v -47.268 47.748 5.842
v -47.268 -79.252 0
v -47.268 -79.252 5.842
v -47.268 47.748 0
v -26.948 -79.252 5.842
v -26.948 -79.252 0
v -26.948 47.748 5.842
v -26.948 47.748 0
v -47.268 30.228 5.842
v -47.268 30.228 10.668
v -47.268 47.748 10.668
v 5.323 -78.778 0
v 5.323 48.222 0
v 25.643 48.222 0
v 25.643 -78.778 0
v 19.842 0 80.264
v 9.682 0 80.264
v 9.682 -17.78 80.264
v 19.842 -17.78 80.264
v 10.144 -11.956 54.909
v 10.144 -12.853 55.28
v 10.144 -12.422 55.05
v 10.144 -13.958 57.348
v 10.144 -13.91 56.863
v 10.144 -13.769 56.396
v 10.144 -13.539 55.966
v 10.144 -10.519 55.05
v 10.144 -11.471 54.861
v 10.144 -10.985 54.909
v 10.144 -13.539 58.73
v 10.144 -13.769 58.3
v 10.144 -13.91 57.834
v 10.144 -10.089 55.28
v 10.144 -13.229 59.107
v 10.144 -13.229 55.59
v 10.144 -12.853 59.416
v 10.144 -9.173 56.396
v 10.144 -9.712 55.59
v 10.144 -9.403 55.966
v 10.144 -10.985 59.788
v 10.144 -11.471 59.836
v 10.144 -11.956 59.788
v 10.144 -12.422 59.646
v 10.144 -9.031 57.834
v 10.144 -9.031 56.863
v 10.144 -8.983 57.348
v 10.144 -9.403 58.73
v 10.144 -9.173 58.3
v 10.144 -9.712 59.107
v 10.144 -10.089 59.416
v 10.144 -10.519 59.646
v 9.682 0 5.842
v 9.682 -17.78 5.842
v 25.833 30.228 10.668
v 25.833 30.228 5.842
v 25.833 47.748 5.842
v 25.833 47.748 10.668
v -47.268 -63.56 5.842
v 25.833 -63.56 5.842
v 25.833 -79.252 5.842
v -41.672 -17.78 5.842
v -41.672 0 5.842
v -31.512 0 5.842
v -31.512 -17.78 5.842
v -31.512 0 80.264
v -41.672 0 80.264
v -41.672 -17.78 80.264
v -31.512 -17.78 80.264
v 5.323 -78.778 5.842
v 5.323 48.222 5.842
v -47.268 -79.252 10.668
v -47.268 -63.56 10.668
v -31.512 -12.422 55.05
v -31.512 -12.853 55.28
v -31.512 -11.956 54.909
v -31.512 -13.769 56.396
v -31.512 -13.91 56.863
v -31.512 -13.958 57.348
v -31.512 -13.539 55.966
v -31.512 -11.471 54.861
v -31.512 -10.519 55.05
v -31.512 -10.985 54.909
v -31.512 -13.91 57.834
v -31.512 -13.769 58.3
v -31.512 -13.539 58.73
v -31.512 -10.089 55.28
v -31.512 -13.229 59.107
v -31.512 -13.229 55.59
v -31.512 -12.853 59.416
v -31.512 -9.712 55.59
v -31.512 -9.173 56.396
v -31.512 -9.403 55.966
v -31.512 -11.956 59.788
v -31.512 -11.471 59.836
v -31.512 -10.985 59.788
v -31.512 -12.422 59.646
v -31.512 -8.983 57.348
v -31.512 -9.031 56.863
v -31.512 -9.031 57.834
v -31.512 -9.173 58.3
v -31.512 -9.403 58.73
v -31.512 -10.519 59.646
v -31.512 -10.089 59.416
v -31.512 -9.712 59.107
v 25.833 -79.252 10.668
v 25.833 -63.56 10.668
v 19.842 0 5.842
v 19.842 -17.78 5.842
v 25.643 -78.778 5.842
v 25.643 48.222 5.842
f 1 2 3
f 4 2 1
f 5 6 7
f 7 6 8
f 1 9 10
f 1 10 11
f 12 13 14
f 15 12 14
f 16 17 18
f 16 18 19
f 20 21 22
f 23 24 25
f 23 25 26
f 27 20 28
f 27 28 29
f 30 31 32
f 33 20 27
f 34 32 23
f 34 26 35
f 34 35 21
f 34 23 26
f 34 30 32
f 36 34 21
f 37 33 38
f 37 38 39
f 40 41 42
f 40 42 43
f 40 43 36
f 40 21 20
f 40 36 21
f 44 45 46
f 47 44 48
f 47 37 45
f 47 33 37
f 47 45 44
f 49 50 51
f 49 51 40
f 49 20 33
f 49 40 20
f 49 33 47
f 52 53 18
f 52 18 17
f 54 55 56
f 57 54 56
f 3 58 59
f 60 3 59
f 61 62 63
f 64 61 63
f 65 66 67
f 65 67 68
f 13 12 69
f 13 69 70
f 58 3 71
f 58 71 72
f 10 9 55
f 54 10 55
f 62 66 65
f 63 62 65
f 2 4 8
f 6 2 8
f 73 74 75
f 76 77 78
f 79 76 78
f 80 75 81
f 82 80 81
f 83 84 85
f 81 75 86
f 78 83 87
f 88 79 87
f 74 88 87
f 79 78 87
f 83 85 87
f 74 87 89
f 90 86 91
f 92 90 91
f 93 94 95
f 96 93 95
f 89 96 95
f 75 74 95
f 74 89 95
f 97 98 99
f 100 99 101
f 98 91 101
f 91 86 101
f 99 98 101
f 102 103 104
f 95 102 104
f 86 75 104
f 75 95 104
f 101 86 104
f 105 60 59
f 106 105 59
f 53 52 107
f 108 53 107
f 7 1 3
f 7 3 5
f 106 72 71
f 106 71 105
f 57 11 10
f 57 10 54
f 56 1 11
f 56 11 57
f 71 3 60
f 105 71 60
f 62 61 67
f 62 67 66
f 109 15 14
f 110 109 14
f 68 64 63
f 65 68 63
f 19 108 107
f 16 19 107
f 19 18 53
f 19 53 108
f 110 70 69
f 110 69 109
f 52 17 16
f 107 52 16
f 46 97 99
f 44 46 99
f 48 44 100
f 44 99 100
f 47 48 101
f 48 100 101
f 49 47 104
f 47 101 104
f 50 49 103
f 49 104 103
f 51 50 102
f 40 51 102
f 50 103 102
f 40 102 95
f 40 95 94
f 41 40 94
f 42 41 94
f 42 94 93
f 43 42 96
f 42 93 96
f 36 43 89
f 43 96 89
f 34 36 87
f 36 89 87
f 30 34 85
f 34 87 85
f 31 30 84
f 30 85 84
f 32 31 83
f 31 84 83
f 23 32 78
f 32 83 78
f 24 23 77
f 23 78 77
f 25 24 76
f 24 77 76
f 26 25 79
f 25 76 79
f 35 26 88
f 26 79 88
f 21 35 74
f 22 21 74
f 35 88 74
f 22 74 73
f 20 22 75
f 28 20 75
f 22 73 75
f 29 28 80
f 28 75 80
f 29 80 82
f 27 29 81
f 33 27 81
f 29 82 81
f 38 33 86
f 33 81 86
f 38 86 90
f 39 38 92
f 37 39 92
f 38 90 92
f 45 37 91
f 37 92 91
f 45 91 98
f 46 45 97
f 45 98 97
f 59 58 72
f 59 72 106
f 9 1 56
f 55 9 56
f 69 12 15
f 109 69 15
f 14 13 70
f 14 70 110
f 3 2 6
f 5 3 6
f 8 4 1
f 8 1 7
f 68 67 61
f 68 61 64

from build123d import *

# Parameters (mm, degrees)
F0_W     = 20.32
F0_H     = 127
F1_DEPTH = 5.842
F2_W     = 10.16
F2_H     = 17.78
F3_DEPTH = 74.422
F5_R     = 2.487291
F6_DEPTH = 41.656
F7_W     = 73.10063
F7_H     = 15.692239
F7_H_2   = 17.519198
F8_DEPTH = 4.826


with BuildPart() as f1:
    # F0 (on Top) → F1 (new body)
    with BuildSketch(Plane.XY):
        with Locations((-37.10764, -15.75239)):
            Rectangle(F0_W, F0_H)
        with Locations((15.482787, -15.27817)):
            Rectangle(F0_W, F0_H)
    extrude(amount=F1_DEPTH)


with BuildPart() as f3:
    # F2 (on face) → F3 (new body)
    with BuildSketch(Plane.XY.offset(5.842)):
        with Locations((-36.59238, -8.89)):
            Rectangle(F2_W, F2_H)
        with Locations((14.762063, -8.89)):
            Rectangle(F2_W, F2_H)
    extrude(amount=F3_DEPTH)


with BuildPart() as f6:
    # F5 (on face) → F6 (new body)
    with BuildSketch(Plane.YZ.offset(-31.51238)):
        with Locations((-11.470643, 57.3483)):
            Circle(F5_R)
    extrude(amount=F6_DEPTH)


with BuildPart() as f8:
    # F7 (on face) → F8 (new body)
    with BuildSketch(Plane.XY.offset(5.842)):
        with Locations((-10.717325, -71.40627)):
            Rectangle(F7_W, F7_H)
        with Locations((-10.717325, 38.988011)):
            Rectangle(F7_W, F7_H_2)
    extrude(amount=F8_DEPTH)


solid = Compound([f1.part, f3.part, f6.part, f8.part])
